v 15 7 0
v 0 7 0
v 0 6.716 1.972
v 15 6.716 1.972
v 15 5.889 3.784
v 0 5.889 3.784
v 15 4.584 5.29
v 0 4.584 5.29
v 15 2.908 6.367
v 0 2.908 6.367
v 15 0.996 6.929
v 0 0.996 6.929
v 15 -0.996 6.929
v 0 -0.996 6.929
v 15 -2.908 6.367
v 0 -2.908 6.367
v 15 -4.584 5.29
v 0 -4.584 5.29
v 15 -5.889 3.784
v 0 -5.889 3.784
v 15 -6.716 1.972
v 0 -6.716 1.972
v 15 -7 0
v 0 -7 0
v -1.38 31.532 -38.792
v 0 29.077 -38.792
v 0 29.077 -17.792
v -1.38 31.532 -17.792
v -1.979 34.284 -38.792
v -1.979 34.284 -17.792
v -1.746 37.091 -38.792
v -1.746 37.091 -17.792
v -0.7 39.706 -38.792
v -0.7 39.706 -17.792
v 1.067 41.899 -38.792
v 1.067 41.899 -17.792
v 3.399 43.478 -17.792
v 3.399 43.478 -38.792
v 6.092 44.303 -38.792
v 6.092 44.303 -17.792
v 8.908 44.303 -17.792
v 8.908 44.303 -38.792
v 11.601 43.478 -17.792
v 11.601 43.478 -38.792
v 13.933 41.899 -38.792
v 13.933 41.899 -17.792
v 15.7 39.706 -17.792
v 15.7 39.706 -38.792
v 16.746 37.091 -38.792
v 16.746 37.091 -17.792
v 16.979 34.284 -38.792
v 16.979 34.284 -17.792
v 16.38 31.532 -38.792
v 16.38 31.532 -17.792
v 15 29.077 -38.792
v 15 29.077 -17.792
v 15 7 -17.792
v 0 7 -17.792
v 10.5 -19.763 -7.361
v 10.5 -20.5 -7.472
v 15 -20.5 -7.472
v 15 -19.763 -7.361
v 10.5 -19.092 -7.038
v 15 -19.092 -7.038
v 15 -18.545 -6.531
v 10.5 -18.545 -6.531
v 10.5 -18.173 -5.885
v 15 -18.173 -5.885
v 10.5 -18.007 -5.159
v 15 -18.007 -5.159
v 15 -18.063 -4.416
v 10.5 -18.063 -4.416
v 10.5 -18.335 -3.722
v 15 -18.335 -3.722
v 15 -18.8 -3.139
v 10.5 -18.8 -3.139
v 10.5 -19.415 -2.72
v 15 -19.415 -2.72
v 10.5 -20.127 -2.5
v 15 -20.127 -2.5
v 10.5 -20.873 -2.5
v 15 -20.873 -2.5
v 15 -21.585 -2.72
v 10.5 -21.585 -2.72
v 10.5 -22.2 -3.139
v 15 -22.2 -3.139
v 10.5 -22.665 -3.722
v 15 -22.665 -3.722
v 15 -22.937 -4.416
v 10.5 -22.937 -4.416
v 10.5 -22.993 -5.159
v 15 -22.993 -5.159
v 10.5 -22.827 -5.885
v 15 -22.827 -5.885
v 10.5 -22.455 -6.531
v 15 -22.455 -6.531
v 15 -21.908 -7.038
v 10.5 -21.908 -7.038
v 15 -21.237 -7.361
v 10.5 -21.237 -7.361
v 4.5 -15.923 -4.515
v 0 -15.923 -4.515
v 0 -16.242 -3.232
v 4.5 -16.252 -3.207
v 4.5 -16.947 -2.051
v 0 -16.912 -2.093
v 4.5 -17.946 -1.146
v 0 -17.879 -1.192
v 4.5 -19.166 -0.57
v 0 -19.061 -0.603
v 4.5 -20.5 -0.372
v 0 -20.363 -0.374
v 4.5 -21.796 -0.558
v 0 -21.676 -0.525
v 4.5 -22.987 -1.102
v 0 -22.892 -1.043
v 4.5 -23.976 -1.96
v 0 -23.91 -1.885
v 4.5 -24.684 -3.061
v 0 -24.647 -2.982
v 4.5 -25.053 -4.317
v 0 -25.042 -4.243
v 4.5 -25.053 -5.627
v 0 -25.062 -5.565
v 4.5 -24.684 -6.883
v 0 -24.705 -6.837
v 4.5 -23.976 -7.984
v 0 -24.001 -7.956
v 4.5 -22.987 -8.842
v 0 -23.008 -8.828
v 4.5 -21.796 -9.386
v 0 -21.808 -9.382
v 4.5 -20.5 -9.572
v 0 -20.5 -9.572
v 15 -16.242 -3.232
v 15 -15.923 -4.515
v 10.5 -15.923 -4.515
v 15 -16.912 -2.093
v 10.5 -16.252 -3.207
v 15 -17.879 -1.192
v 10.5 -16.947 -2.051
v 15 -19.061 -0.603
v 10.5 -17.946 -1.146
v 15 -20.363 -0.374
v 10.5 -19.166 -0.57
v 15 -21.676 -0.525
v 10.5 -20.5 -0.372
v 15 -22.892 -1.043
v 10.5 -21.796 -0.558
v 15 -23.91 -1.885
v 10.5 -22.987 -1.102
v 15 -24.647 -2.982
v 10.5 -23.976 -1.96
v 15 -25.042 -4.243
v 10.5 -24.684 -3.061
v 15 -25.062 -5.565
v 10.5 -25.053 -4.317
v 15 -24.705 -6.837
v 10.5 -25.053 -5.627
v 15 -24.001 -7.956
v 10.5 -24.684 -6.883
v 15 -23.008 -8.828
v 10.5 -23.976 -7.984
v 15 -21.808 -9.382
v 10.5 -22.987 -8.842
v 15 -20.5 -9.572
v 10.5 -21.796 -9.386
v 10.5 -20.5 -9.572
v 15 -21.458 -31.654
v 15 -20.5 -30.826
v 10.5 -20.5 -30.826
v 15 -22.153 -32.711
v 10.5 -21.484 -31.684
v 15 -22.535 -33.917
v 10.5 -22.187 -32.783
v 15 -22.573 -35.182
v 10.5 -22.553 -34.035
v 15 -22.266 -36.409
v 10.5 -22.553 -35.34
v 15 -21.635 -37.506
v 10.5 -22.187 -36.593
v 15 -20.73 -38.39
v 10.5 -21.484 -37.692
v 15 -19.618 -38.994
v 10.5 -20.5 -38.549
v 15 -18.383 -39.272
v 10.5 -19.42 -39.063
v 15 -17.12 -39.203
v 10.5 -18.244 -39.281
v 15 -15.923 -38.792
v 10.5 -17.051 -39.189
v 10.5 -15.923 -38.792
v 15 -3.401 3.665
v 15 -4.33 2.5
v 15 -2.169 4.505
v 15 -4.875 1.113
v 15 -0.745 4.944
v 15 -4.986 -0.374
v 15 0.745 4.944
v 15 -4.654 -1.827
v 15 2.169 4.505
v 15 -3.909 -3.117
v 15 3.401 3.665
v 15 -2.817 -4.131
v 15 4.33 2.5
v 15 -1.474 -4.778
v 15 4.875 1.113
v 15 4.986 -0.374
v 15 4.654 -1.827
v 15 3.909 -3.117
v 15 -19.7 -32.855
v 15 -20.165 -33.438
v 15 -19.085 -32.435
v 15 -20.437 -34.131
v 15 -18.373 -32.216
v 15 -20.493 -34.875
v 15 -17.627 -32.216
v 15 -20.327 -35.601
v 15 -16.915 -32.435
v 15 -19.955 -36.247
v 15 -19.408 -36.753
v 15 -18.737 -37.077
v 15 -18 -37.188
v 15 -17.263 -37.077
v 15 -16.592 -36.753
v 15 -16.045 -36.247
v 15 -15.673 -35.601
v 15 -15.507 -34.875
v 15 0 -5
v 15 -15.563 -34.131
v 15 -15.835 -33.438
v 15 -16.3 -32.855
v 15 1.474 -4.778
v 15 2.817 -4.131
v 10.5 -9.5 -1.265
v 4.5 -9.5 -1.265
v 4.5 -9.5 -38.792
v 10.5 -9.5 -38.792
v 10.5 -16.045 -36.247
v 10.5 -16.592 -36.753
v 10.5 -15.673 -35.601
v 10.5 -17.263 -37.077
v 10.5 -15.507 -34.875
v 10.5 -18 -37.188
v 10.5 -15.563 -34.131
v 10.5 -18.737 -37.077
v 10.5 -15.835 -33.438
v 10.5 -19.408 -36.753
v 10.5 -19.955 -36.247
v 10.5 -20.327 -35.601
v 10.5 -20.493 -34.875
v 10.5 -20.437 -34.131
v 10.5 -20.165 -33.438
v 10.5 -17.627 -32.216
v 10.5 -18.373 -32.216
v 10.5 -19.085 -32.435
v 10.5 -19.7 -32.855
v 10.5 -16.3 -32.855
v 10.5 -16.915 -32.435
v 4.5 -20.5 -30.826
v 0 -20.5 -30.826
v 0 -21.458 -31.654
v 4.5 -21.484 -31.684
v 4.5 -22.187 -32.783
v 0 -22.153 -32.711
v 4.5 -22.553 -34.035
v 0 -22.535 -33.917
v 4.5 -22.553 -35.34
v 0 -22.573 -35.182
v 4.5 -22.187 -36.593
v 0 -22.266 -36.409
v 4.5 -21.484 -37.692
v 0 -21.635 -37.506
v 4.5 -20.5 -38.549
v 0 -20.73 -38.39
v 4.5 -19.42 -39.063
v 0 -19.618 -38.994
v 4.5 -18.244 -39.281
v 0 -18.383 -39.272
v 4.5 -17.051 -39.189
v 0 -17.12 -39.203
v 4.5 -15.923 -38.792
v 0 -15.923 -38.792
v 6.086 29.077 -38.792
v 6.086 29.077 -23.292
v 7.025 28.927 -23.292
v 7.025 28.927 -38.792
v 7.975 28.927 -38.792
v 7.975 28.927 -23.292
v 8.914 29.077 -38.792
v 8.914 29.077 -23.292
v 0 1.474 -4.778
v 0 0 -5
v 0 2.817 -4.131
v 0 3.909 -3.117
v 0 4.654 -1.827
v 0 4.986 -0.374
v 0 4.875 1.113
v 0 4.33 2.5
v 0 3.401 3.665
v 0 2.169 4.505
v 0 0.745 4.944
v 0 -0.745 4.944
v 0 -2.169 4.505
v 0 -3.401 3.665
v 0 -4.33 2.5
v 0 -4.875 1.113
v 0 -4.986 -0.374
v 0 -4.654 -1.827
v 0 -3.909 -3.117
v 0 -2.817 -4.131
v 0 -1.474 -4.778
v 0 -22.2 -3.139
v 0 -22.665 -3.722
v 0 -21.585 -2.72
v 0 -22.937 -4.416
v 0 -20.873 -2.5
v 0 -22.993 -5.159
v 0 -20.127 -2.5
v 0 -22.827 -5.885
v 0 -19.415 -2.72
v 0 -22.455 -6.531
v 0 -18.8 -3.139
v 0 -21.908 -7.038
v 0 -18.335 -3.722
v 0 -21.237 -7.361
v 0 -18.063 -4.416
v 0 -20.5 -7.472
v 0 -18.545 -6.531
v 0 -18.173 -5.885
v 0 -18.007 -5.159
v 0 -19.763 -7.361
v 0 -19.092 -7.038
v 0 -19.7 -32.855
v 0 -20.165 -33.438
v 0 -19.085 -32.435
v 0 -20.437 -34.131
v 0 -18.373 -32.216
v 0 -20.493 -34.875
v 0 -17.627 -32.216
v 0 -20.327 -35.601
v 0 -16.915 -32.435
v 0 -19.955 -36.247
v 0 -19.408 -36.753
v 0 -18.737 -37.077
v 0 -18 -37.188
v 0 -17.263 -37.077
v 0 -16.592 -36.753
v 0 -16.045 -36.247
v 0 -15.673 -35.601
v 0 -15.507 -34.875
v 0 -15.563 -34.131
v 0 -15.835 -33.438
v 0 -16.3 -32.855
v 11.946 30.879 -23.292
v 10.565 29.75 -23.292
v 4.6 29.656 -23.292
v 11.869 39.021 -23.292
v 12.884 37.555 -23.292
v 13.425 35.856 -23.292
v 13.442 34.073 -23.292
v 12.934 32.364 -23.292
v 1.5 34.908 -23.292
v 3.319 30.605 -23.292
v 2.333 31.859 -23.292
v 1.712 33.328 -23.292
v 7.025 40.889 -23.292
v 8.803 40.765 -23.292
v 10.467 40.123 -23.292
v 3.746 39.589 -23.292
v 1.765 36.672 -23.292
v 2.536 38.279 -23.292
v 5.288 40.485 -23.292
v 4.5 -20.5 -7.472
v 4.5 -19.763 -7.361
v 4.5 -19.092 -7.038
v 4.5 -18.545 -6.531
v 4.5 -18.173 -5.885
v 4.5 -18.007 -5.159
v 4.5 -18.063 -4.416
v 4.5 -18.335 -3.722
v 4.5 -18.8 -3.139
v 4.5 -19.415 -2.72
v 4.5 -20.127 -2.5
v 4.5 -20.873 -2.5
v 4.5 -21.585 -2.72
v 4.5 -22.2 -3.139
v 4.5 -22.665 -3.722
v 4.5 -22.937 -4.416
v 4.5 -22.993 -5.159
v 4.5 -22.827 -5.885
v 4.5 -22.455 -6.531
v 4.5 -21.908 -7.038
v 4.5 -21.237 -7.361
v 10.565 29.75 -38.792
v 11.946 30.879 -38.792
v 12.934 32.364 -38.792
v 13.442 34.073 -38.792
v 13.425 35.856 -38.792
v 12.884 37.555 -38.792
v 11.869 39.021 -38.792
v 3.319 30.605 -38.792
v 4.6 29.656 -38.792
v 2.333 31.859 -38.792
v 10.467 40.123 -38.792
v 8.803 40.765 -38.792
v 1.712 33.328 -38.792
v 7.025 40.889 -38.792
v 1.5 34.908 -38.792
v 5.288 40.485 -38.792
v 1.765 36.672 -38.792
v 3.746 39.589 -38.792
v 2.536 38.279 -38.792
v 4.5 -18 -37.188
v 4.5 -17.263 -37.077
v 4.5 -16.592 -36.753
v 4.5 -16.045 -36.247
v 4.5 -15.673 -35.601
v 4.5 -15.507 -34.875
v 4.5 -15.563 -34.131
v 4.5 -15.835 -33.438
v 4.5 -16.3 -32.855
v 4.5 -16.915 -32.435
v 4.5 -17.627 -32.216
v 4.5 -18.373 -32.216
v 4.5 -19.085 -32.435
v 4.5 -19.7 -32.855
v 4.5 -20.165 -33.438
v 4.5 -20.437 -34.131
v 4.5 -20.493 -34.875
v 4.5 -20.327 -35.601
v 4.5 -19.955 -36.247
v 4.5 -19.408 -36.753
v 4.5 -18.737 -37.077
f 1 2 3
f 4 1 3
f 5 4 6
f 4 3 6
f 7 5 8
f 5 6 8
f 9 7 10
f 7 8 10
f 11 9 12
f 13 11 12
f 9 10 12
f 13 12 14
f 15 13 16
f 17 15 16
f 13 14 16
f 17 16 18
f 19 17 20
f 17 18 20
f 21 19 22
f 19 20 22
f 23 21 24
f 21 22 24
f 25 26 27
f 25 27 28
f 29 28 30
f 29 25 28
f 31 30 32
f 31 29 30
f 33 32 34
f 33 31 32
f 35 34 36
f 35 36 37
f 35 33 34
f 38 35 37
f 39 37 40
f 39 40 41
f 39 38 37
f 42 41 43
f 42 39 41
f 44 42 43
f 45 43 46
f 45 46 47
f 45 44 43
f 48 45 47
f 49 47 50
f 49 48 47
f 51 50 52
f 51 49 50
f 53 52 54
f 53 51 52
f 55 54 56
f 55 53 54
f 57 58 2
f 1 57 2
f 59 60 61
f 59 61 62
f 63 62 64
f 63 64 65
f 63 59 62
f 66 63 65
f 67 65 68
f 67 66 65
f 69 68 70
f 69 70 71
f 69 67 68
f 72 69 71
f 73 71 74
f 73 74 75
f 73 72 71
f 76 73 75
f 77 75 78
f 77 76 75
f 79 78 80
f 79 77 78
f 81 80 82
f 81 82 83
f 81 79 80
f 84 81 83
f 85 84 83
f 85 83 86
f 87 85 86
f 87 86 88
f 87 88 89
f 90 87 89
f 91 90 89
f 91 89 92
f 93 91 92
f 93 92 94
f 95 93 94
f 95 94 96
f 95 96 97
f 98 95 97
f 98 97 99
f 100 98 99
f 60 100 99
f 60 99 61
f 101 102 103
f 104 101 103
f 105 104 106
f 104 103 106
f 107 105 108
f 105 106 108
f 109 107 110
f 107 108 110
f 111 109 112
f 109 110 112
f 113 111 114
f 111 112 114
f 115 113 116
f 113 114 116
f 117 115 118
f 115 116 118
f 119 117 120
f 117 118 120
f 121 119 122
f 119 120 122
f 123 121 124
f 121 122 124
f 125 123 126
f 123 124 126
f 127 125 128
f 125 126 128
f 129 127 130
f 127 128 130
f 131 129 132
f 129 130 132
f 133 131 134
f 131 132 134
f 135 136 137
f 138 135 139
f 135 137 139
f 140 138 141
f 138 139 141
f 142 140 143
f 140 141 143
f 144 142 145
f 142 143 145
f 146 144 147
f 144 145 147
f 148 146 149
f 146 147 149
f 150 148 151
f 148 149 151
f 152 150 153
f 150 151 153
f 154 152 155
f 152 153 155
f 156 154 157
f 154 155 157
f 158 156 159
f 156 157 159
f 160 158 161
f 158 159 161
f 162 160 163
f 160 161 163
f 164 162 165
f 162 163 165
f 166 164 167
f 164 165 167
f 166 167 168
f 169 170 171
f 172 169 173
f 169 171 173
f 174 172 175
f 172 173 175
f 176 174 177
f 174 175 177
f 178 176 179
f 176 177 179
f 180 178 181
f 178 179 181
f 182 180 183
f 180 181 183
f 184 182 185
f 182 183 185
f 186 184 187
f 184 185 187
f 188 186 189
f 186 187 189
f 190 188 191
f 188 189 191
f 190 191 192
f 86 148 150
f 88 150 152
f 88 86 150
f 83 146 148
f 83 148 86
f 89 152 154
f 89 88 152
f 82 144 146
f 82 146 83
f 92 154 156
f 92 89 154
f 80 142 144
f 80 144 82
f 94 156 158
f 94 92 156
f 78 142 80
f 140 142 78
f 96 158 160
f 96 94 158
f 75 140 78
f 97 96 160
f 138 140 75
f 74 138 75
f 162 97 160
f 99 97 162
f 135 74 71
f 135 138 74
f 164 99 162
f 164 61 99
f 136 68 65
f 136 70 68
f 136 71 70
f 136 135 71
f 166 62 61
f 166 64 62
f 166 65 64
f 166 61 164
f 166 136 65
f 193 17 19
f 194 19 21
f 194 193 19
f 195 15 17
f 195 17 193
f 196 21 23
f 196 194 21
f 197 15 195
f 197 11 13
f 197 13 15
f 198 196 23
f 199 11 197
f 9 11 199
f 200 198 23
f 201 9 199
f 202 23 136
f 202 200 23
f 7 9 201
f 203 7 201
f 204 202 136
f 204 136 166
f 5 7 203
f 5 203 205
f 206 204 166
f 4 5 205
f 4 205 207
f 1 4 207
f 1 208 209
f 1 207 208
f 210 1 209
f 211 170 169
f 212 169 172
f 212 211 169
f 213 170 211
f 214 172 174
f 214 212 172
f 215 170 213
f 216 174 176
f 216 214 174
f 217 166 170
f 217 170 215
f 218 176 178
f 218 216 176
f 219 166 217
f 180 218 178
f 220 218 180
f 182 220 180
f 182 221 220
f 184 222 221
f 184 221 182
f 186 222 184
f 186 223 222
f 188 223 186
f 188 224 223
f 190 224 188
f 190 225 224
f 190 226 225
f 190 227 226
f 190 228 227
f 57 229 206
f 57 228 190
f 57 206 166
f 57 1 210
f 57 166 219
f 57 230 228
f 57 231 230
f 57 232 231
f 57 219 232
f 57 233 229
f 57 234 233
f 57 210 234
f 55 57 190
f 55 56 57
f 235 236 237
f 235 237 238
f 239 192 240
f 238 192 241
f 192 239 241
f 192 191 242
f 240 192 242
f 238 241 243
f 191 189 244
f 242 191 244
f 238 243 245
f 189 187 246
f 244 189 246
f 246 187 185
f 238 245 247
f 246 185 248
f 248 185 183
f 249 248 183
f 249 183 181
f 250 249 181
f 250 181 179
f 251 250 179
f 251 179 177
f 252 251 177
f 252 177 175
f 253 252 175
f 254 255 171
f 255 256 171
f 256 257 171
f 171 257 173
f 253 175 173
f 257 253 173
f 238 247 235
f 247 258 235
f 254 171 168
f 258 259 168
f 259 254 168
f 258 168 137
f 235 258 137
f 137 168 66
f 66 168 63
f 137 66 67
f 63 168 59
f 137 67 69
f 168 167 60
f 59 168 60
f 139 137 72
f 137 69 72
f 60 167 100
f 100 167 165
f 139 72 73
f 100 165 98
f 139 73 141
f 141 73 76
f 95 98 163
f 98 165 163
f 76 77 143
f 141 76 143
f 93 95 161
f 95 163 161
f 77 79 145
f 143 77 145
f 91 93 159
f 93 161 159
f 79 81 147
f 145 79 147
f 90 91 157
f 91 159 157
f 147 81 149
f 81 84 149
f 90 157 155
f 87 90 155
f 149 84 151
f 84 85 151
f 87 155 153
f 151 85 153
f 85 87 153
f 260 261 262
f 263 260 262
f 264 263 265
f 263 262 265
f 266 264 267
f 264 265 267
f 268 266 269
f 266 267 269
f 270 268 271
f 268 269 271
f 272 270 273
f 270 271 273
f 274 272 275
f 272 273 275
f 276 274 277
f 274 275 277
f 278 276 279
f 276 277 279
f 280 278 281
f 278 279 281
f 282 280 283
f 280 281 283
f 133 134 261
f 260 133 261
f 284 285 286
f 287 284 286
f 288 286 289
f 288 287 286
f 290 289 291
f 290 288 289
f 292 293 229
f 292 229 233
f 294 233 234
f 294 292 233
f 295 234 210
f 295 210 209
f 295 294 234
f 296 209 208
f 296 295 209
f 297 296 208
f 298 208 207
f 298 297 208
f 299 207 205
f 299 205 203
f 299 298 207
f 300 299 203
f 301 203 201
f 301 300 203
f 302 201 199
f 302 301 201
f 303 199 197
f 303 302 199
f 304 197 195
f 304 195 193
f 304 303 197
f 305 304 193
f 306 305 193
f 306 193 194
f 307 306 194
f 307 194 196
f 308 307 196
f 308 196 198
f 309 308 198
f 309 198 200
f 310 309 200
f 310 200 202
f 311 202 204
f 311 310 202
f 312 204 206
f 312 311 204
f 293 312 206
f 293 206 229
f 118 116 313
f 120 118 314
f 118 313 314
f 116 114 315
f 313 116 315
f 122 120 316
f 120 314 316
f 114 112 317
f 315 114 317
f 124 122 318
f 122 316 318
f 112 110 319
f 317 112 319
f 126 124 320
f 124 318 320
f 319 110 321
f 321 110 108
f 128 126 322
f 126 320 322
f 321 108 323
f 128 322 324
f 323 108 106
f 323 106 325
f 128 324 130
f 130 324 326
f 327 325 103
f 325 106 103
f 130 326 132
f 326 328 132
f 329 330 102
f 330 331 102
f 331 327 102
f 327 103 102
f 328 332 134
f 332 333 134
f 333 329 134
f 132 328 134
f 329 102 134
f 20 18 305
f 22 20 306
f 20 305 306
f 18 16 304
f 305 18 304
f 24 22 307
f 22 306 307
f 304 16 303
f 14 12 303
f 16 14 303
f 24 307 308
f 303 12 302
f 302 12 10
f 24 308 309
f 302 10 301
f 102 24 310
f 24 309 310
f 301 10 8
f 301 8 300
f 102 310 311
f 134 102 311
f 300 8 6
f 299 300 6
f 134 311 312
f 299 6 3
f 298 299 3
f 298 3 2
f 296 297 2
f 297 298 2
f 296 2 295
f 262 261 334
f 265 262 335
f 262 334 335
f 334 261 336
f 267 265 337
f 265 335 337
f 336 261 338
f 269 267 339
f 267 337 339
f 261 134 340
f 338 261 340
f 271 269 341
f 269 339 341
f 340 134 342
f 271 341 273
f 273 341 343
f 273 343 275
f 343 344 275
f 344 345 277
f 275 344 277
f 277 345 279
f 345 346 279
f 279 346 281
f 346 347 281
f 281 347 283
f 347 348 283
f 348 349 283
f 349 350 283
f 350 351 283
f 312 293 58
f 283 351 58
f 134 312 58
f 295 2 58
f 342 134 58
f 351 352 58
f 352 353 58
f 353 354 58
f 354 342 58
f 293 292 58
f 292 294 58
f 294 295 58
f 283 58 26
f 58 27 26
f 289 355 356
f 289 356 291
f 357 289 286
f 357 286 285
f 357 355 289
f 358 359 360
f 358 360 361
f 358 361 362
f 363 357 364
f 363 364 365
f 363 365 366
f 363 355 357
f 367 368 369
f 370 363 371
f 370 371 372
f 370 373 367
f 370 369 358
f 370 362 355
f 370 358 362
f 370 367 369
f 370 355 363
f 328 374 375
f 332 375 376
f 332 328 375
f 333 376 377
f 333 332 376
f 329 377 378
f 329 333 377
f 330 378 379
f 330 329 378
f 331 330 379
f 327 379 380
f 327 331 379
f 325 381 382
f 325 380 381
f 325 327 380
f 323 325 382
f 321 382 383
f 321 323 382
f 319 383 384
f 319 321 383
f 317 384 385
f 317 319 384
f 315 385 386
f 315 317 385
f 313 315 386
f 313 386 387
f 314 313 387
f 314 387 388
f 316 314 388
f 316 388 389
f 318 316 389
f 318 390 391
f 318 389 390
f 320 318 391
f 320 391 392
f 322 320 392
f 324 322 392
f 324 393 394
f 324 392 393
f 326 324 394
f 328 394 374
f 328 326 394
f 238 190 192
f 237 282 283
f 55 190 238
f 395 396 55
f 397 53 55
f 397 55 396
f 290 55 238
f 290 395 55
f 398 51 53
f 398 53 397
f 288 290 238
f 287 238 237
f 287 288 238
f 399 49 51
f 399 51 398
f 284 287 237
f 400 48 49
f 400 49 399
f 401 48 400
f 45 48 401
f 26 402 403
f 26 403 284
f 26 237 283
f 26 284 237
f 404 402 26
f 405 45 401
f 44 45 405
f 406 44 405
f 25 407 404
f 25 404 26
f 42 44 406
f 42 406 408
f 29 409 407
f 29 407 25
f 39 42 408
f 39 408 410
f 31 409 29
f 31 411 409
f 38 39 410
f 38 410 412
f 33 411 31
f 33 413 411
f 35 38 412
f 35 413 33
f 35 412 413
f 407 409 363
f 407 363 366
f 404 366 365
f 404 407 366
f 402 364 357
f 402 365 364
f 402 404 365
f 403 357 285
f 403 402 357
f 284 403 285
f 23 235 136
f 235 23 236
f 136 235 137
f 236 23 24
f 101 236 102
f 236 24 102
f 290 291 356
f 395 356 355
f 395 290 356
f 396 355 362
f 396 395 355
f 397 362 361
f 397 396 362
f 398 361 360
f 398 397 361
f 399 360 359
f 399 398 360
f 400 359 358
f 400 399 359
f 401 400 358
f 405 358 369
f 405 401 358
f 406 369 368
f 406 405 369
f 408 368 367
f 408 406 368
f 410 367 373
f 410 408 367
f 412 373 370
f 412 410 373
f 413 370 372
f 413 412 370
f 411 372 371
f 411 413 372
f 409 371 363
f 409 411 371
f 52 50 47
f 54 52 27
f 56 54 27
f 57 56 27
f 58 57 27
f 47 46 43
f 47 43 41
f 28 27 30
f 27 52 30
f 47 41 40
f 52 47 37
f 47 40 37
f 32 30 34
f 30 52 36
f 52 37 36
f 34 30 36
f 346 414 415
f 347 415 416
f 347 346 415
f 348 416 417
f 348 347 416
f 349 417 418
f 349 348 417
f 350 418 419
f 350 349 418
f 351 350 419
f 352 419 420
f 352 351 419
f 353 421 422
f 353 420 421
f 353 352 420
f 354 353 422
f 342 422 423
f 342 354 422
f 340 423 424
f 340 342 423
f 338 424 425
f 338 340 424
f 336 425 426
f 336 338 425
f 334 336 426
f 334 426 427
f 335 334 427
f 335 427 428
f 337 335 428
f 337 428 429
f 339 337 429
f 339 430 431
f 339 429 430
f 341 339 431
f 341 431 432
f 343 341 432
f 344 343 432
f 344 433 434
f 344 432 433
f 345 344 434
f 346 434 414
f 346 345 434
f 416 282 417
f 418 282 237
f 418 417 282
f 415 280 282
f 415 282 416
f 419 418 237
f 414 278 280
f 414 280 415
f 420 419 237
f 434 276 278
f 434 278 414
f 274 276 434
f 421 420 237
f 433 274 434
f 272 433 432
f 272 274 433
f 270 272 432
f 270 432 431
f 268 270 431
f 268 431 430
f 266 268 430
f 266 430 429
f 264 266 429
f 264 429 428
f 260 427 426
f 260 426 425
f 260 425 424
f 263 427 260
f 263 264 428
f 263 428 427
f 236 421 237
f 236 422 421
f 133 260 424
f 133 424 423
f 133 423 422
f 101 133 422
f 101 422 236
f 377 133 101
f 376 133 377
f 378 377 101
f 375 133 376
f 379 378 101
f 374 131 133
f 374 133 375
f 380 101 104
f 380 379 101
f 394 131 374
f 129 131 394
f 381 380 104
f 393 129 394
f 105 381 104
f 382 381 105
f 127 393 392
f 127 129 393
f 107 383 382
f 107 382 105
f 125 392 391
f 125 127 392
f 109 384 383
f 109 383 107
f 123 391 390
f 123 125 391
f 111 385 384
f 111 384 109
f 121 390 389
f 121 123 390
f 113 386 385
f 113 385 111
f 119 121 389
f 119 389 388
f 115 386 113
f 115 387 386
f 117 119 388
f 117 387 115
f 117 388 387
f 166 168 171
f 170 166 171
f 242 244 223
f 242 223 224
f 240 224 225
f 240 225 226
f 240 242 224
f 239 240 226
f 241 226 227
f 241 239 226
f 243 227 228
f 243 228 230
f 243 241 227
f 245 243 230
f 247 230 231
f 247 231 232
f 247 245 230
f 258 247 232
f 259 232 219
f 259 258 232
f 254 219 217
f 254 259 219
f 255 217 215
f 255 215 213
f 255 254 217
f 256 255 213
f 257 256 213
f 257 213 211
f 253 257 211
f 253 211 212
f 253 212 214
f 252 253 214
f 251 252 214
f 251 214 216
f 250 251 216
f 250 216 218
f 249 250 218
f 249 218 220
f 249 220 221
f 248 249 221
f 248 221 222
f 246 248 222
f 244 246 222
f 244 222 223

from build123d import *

# Parameters (mm, degrees)
SKETCH1_R           = 5
SKETCH1_R_2         = 2.5
BOSS_EXTRUDE2_DEPTH = 15
SKETCH2_W           = 6
SKETCH2_H           = 38.915837439
CUT_EXTRUDE1_DEPTH  = 11
CUT_EXTRUDE2_START  = -4.5
SKETCH3_R           = 4.6
SKETCH3_R_2         = 2.5
CUT_EXTRUDE2_DEPTH  = 6
CUT_EXTRUDE3_START  = -10.5
SKETCH4_R           = 4.6
SKETCH4_R_2         = 2.5
CUT_EXTRUDE3_DEPTH  = 6
BOSS_EXTRUDE3_DEPTH = 21
CUT_EXTRUDE4_DEPTH  = 67.015153021
BOSS_EXTRUDE4_START = -15.5
SKETCH8_R           = 6
BOSS_EXTRUDE4_DEPTH = 5.5


with BuildPart() as part:
    # Sketch1 → Boss-Extrude2 (new body)
    with BuildSketch(Plane(origin=(0, 0, 0), x_dir=(0, 0, -1), z_dir=(1, 0, 0))):
        with BuildLine():
            Line((0, -7), (4.514898748, -15.922762425))
            ThreePointArc((4.514898748, -15.922762425), (1.88507796, -23.910457261), (9.571950369, -20.5))
            Line((9.571950369, -20.5), (30.826440892, -20.5))
            ThreePointArc((30.826440892, -20.5), (36.979627599, -21.988417026), (38.792064121, -15.922762425))
            Line((38.792064121, -15.922762425), (38.792064121, 29.077237575))
            Line((38.792064121, 29.077237575), (17.792064121, 29.077237575))
            Line((17.792064121, 29.077237575), (17.792064121, 7))
            Line((17.792064121, 7), (0, 7))
            ThreePointArc((0, 7), (-7, 0), (0, -7))
        make_face()
        Circle(SKETCH1_R, mode=Mode.SUBTRACT)
        with Locations((4.971950369, -20.5)):
            Circle(SKETCH1_R_2, mode=Mode.SUBTRACT)
        with Locations((34.687787808, -18)):
            Circle(SKETCH1_R_2, mode=Mode.SUBTRACT)
    extrude(amount=BOSS_EXTRUDE2_DEPTH)

    # Sketch2 → Cut-Extrude1 (cut)
    with BuildSketch(Plane.XZ.offset(20.5)):
        with Locations((7.5, -19.829869089)):
            Rectangle(SKETCH2_W, SKETCH2_H)
    extrude(amount=-CUT_EXTRUDE1_DEPTH, mode=Mode.SUBTRACT)

    # Sketch3 → Cut-Extrude2 (cut)
    with BuildSketch(Plane.ZY.offset(CUT_EXTRUDE2_START)):
        with Locations((-4.971950369, -20.5)):
            Circle(SKETCH3_R)
        with Locations(Location((-4.971950369, -20.5, 0), (0, 0, 180))):
            Circle(SKETCH3_R_2, mode=Mode.SUBTRACT)
    extrude(amount=-CUT_EXTRUDE2_DEPTH, mode=Mode.SUBTRACT)

    # Sketch4 → Cut-Extrude3 (cut)
    with BuildSketch(Plane(origin=(15, 0, 0), x_dir=(0, 0, -1), z_dir=(1, 0, 0)).offset(CUT_EXTRUDE3_START)):
        with Locations((34.687787808, -18)):
            Circle(SKETCH4_R)
        with Locations((34.687787808, -18)):
            Circle(SKETCH4_R_2, mode=Mode.SUBTRACT)
    extrude(amount=CUT_EXTRUDE3_DEPTH, mode=Mode.SUBTRACT)

    # Sketch6 → Boss-Extrude3 (add)
    with BuildSketch(Plane(origin=(0, 0, -38.792064121), x_dir=(-1, 0, 0), z_dir=(0, 0, -1))):
        with BuildLine():
            ThreePointArc((0, 29.077237575), (-7.5, 44.40818947), (-15, 29.077237575))
            Line((-15, 29.077237575), (-8.914213562, 29.077237575))
            ThreePointArc((-8.914213562, 29.077237575), (-11.20909144, 39.624399885), (-1.5, 34.90818947))
            ThreePointArc((-1.5, 34.90818947), (-2.783789584, 31.199098029), (-6.085786438, 29.077237575))
            Line((-6.085786438, 29.077237575), (0, 29.077237575))
        make_face()
    extrude(amount=-BOSS_EXTRUDE3_DEPTH)

    # Sketch7 → Cut-Extrude4 (cut, through all)
    with BuildSketch(Plane(origin=(0, 0, -38.792064121), x_dir=(-1, 0, 0), z_dir=(0, 0, -1))):
        with BuildLine():
            Line((-8.914213562, 29.077237575), (-6.085786438, 29.077237575))
            ThreePointArc((-6.085786438, 29.077237575), (-7.5, 28.90818947), (-8.914213562, 29.077237575))
        make_face()
    extrude(amount=-CUT_EXTRUDE4_DEPTH, mode=Mode.SUBTRACT)

    # Sketch8 → Boss-Extrude4 (add)
    with BuildSketch(Plane(origin=(0, 0, -38.792064121), x_dir=(-1, 0, 0), z_dir=(0, 0, -1)).offset(BOSS_EXTRUDE4_START)):
        with Locations((-7.5, 34.90818947)):
            Circle(SKETCH8_R)
    extrude(amount=-BOSS_EXTRUDE4_DEPTH)


solid = part.part
